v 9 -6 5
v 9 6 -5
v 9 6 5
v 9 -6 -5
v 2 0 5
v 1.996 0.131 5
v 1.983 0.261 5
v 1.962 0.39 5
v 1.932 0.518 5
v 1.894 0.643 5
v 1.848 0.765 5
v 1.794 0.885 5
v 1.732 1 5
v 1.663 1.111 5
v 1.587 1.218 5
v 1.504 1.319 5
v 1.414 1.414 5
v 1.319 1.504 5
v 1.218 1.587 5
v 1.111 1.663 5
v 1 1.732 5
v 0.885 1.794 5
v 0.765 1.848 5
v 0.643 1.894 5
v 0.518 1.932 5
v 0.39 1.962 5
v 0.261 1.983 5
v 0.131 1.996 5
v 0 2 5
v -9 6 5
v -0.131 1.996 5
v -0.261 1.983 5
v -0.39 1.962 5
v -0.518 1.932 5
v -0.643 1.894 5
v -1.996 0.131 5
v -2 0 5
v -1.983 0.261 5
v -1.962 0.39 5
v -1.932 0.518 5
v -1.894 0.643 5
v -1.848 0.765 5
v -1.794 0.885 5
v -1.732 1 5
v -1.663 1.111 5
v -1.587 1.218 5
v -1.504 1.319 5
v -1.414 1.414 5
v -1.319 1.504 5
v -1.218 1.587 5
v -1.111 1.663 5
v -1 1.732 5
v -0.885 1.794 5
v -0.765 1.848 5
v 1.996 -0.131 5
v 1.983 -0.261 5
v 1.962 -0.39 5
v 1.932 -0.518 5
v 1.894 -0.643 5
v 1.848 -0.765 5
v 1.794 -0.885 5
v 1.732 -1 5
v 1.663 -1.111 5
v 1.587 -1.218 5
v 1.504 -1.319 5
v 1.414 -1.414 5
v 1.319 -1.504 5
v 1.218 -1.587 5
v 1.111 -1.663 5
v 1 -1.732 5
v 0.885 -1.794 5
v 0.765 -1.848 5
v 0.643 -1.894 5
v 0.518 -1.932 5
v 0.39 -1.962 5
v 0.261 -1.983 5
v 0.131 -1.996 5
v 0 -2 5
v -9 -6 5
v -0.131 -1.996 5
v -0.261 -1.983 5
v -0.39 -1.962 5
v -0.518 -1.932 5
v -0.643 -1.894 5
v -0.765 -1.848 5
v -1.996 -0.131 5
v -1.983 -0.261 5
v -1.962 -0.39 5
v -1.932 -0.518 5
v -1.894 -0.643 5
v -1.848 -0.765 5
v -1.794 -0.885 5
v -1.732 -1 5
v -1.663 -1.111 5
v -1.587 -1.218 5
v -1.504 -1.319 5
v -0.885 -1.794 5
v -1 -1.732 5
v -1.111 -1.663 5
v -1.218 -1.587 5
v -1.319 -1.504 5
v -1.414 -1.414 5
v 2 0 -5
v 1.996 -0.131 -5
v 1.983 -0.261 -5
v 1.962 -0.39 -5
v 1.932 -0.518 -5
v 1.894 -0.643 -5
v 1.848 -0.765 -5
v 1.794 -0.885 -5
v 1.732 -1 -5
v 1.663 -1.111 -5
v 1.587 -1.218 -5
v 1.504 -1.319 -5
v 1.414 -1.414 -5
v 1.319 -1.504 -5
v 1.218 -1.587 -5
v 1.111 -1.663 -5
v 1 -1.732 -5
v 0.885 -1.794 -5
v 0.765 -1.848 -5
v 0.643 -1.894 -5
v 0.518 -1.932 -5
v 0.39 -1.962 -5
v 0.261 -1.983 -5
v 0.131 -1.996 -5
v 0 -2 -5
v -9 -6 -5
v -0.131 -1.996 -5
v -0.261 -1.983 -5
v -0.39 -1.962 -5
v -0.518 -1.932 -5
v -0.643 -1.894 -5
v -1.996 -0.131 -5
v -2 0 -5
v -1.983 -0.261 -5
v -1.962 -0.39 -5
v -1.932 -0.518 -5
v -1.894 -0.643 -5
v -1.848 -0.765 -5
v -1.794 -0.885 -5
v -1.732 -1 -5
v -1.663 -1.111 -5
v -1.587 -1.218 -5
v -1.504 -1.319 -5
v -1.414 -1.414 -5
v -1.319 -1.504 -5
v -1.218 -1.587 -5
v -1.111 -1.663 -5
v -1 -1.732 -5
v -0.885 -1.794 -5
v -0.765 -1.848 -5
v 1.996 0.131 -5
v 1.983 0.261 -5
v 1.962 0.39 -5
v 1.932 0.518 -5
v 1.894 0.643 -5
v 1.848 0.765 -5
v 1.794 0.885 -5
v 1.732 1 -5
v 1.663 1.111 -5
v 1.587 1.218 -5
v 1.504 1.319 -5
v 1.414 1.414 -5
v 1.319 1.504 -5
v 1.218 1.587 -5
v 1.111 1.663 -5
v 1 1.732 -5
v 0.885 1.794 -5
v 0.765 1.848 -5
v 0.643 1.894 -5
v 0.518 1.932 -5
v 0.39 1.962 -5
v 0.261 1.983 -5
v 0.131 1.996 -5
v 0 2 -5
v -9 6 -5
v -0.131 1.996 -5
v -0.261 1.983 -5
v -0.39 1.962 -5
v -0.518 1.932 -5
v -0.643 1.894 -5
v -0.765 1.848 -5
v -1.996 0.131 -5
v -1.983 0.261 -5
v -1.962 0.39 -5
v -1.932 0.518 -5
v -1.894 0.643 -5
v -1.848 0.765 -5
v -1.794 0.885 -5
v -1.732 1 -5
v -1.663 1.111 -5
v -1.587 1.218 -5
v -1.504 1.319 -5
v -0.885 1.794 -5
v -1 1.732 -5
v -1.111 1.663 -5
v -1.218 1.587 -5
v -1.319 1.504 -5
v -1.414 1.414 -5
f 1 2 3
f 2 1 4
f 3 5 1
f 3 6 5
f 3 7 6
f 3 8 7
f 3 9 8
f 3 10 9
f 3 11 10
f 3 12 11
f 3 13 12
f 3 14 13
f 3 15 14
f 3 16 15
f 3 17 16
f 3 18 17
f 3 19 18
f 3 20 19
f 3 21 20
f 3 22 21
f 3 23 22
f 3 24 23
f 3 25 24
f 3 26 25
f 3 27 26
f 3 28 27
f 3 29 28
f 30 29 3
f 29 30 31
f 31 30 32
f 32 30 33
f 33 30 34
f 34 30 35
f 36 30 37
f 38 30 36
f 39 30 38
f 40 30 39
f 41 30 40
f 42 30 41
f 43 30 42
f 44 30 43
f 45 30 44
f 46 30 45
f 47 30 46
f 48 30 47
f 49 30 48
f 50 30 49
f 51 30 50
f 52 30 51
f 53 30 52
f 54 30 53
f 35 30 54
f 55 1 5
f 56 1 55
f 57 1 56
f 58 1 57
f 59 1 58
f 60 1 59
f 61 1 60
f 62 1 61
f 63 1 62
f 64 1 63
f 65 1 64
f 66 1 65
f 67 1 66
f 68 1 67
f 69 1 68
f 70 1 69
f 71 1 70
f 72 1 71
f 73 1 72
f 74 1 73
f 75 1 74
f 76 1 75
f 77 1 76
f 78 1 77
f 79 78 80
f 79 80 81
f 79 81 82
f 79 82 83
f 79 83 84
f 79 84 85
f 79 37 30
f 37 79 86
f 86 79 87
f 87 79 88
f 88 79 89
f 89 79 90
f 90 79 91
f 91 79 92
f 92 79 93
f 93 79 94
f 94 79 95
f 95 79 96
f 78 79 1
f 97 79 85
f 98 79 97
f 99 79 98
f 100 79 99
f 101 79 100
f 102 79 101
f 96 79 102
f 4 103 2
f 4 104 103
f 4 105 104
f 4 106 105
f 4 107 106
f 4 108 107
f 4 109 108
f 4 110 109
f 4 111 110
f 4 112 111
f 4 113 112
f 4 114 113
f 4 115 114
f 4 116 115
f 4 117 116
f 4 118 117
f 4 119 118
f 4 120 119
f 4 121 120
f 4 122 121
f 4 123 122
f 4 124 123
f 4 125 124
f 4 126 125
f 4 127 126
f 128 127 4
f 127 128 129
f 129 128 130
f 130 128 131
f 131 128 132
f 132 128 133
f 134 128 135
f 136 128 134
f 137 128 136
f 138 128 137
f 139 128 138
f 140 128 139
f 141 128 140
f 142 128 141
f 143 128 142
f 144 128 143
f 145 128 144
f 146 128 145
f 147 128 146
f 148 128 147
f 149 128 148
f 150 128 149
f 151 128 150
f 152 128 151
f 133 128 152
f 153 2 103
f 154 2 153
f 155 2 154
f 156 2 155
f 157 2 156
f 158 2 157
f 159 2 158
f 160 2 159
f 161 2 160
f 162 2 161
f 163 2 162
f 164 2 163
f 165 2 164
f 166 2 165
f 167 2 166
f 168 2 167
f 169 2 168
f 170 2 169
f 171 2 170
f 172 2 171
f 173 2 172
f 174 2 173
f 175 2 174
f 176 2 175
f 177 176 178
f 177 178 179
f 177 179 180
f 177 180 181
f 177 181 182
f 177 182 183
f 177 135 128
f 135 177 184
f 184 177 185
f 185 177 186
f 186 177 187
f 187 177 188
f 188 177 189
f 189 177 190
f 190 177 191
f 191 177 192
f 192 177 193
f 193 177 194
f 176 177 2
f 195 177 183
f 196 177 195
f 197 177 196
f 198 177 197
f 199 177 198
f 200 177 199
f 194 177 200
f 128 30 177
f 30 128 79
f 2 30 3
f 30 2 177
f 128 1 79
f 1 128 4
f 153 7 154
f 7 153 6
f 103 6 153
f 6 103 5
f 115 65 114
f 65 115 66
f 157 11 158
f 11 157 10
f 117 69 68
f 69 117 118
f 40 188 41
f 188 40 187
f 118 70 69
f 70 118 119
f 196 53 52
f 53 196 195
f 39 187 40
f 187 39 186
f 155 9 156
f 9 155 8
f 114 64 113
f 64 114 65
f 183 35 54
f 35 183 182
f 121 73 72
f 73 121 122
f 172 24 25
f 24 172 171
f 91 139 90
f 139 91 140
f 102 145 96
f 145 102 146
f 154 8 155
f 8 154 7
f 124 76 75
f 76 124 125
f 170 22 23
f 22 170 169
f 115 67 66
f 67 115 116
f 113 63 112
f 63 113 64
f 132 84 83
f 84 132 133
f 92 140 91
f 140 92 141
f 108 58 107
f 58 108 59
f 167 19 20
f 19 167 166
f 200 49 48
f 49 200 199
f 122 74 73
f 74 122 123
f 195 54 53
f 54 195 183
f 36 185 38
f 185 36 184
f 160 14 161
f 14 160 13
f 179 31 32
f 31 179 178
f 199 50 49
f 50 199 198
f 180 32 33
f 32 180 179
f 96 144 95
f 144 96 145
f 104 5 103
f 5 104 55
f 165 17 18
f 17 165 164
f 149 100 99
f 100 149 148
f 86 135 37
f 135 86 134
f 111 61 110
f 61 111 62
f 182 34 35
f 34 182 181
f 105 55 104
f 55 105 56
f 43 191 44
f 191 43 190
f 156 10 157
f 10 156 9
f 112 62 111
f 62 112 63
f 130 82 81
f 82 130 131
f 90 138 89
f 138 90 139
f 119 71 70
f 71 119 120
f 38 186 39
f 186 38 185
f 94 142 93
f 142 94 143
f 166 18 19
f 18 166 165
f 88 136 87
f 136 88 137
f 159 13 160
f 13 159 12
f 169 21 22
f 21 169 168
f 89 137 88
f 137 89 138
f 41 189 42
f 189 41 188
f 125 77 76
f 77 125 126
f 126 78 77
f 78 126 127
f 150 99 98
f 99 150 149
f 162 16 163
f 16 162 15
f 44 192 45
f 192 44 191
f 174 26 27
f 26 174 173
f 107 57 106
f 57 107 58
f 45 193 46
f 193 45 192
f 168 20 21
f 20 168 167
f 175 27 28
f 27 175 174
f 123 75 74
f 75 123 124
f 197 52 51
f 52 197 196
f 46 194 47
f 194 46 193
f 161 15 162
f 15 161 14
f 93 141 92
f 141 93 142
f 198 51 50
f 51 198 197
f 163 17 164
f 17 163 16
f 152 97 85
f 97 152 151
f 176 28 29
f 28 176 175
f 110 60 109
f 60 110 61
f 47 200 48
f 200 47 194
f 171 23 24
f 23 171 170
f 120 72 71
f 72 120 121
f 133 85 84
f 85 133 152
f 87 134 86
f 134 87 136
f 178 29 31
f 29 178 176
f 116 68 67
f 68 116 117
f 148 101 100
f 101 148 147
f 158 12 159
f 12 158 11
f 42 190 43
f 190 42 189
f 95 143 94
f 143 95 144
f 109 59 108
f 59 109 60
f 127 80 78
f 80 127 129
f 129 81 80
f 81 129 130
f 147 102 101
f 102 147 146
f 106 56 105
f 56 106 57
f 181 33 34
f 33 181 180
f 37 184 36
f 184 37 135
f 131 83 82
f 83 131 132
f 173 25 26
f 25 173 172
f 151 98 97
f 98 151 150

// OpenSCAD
// Auto-generated from tests/data/feature_fixtures_manifest.json
// fixture: box_z_through_hole
// fixture_type: box
// description: Centered box with one through-hole along the z axis.
$fn = 96;

box_size = [18.000000, 12.000000, 10.000000];
box_origin = [-9.000000, -6.000000, -5.000000];

module through_hole_x(center, diameter, length) {
  translate([box_origin[0] - 0.1, center[1], center[2]])
    rotate(a=90, v=[0, 1, 0]) cylinder(d=diameter, h=length, center=false);
}

module through_hole_y(center, diameter, length) {
  translate([center[0], box_origin[1] - 0.1, center[2]])
    rotate(a=90, v=[-1, 0, 0]) cylinder(d=diameter, h=length, center=false);
}

module through_hole_z(center, diameter, length) {
  translate([center[0], center[1], box_origin[2] - 0.1])
    cylinder(d=diameter, h=length, center=false);
}

difference() {
  translate(box_origin) cube(box_size);
  through_hole_z([0.000000, 0.000000, 0.000000], 4.000000, 10.200000);  // hole_0
}
